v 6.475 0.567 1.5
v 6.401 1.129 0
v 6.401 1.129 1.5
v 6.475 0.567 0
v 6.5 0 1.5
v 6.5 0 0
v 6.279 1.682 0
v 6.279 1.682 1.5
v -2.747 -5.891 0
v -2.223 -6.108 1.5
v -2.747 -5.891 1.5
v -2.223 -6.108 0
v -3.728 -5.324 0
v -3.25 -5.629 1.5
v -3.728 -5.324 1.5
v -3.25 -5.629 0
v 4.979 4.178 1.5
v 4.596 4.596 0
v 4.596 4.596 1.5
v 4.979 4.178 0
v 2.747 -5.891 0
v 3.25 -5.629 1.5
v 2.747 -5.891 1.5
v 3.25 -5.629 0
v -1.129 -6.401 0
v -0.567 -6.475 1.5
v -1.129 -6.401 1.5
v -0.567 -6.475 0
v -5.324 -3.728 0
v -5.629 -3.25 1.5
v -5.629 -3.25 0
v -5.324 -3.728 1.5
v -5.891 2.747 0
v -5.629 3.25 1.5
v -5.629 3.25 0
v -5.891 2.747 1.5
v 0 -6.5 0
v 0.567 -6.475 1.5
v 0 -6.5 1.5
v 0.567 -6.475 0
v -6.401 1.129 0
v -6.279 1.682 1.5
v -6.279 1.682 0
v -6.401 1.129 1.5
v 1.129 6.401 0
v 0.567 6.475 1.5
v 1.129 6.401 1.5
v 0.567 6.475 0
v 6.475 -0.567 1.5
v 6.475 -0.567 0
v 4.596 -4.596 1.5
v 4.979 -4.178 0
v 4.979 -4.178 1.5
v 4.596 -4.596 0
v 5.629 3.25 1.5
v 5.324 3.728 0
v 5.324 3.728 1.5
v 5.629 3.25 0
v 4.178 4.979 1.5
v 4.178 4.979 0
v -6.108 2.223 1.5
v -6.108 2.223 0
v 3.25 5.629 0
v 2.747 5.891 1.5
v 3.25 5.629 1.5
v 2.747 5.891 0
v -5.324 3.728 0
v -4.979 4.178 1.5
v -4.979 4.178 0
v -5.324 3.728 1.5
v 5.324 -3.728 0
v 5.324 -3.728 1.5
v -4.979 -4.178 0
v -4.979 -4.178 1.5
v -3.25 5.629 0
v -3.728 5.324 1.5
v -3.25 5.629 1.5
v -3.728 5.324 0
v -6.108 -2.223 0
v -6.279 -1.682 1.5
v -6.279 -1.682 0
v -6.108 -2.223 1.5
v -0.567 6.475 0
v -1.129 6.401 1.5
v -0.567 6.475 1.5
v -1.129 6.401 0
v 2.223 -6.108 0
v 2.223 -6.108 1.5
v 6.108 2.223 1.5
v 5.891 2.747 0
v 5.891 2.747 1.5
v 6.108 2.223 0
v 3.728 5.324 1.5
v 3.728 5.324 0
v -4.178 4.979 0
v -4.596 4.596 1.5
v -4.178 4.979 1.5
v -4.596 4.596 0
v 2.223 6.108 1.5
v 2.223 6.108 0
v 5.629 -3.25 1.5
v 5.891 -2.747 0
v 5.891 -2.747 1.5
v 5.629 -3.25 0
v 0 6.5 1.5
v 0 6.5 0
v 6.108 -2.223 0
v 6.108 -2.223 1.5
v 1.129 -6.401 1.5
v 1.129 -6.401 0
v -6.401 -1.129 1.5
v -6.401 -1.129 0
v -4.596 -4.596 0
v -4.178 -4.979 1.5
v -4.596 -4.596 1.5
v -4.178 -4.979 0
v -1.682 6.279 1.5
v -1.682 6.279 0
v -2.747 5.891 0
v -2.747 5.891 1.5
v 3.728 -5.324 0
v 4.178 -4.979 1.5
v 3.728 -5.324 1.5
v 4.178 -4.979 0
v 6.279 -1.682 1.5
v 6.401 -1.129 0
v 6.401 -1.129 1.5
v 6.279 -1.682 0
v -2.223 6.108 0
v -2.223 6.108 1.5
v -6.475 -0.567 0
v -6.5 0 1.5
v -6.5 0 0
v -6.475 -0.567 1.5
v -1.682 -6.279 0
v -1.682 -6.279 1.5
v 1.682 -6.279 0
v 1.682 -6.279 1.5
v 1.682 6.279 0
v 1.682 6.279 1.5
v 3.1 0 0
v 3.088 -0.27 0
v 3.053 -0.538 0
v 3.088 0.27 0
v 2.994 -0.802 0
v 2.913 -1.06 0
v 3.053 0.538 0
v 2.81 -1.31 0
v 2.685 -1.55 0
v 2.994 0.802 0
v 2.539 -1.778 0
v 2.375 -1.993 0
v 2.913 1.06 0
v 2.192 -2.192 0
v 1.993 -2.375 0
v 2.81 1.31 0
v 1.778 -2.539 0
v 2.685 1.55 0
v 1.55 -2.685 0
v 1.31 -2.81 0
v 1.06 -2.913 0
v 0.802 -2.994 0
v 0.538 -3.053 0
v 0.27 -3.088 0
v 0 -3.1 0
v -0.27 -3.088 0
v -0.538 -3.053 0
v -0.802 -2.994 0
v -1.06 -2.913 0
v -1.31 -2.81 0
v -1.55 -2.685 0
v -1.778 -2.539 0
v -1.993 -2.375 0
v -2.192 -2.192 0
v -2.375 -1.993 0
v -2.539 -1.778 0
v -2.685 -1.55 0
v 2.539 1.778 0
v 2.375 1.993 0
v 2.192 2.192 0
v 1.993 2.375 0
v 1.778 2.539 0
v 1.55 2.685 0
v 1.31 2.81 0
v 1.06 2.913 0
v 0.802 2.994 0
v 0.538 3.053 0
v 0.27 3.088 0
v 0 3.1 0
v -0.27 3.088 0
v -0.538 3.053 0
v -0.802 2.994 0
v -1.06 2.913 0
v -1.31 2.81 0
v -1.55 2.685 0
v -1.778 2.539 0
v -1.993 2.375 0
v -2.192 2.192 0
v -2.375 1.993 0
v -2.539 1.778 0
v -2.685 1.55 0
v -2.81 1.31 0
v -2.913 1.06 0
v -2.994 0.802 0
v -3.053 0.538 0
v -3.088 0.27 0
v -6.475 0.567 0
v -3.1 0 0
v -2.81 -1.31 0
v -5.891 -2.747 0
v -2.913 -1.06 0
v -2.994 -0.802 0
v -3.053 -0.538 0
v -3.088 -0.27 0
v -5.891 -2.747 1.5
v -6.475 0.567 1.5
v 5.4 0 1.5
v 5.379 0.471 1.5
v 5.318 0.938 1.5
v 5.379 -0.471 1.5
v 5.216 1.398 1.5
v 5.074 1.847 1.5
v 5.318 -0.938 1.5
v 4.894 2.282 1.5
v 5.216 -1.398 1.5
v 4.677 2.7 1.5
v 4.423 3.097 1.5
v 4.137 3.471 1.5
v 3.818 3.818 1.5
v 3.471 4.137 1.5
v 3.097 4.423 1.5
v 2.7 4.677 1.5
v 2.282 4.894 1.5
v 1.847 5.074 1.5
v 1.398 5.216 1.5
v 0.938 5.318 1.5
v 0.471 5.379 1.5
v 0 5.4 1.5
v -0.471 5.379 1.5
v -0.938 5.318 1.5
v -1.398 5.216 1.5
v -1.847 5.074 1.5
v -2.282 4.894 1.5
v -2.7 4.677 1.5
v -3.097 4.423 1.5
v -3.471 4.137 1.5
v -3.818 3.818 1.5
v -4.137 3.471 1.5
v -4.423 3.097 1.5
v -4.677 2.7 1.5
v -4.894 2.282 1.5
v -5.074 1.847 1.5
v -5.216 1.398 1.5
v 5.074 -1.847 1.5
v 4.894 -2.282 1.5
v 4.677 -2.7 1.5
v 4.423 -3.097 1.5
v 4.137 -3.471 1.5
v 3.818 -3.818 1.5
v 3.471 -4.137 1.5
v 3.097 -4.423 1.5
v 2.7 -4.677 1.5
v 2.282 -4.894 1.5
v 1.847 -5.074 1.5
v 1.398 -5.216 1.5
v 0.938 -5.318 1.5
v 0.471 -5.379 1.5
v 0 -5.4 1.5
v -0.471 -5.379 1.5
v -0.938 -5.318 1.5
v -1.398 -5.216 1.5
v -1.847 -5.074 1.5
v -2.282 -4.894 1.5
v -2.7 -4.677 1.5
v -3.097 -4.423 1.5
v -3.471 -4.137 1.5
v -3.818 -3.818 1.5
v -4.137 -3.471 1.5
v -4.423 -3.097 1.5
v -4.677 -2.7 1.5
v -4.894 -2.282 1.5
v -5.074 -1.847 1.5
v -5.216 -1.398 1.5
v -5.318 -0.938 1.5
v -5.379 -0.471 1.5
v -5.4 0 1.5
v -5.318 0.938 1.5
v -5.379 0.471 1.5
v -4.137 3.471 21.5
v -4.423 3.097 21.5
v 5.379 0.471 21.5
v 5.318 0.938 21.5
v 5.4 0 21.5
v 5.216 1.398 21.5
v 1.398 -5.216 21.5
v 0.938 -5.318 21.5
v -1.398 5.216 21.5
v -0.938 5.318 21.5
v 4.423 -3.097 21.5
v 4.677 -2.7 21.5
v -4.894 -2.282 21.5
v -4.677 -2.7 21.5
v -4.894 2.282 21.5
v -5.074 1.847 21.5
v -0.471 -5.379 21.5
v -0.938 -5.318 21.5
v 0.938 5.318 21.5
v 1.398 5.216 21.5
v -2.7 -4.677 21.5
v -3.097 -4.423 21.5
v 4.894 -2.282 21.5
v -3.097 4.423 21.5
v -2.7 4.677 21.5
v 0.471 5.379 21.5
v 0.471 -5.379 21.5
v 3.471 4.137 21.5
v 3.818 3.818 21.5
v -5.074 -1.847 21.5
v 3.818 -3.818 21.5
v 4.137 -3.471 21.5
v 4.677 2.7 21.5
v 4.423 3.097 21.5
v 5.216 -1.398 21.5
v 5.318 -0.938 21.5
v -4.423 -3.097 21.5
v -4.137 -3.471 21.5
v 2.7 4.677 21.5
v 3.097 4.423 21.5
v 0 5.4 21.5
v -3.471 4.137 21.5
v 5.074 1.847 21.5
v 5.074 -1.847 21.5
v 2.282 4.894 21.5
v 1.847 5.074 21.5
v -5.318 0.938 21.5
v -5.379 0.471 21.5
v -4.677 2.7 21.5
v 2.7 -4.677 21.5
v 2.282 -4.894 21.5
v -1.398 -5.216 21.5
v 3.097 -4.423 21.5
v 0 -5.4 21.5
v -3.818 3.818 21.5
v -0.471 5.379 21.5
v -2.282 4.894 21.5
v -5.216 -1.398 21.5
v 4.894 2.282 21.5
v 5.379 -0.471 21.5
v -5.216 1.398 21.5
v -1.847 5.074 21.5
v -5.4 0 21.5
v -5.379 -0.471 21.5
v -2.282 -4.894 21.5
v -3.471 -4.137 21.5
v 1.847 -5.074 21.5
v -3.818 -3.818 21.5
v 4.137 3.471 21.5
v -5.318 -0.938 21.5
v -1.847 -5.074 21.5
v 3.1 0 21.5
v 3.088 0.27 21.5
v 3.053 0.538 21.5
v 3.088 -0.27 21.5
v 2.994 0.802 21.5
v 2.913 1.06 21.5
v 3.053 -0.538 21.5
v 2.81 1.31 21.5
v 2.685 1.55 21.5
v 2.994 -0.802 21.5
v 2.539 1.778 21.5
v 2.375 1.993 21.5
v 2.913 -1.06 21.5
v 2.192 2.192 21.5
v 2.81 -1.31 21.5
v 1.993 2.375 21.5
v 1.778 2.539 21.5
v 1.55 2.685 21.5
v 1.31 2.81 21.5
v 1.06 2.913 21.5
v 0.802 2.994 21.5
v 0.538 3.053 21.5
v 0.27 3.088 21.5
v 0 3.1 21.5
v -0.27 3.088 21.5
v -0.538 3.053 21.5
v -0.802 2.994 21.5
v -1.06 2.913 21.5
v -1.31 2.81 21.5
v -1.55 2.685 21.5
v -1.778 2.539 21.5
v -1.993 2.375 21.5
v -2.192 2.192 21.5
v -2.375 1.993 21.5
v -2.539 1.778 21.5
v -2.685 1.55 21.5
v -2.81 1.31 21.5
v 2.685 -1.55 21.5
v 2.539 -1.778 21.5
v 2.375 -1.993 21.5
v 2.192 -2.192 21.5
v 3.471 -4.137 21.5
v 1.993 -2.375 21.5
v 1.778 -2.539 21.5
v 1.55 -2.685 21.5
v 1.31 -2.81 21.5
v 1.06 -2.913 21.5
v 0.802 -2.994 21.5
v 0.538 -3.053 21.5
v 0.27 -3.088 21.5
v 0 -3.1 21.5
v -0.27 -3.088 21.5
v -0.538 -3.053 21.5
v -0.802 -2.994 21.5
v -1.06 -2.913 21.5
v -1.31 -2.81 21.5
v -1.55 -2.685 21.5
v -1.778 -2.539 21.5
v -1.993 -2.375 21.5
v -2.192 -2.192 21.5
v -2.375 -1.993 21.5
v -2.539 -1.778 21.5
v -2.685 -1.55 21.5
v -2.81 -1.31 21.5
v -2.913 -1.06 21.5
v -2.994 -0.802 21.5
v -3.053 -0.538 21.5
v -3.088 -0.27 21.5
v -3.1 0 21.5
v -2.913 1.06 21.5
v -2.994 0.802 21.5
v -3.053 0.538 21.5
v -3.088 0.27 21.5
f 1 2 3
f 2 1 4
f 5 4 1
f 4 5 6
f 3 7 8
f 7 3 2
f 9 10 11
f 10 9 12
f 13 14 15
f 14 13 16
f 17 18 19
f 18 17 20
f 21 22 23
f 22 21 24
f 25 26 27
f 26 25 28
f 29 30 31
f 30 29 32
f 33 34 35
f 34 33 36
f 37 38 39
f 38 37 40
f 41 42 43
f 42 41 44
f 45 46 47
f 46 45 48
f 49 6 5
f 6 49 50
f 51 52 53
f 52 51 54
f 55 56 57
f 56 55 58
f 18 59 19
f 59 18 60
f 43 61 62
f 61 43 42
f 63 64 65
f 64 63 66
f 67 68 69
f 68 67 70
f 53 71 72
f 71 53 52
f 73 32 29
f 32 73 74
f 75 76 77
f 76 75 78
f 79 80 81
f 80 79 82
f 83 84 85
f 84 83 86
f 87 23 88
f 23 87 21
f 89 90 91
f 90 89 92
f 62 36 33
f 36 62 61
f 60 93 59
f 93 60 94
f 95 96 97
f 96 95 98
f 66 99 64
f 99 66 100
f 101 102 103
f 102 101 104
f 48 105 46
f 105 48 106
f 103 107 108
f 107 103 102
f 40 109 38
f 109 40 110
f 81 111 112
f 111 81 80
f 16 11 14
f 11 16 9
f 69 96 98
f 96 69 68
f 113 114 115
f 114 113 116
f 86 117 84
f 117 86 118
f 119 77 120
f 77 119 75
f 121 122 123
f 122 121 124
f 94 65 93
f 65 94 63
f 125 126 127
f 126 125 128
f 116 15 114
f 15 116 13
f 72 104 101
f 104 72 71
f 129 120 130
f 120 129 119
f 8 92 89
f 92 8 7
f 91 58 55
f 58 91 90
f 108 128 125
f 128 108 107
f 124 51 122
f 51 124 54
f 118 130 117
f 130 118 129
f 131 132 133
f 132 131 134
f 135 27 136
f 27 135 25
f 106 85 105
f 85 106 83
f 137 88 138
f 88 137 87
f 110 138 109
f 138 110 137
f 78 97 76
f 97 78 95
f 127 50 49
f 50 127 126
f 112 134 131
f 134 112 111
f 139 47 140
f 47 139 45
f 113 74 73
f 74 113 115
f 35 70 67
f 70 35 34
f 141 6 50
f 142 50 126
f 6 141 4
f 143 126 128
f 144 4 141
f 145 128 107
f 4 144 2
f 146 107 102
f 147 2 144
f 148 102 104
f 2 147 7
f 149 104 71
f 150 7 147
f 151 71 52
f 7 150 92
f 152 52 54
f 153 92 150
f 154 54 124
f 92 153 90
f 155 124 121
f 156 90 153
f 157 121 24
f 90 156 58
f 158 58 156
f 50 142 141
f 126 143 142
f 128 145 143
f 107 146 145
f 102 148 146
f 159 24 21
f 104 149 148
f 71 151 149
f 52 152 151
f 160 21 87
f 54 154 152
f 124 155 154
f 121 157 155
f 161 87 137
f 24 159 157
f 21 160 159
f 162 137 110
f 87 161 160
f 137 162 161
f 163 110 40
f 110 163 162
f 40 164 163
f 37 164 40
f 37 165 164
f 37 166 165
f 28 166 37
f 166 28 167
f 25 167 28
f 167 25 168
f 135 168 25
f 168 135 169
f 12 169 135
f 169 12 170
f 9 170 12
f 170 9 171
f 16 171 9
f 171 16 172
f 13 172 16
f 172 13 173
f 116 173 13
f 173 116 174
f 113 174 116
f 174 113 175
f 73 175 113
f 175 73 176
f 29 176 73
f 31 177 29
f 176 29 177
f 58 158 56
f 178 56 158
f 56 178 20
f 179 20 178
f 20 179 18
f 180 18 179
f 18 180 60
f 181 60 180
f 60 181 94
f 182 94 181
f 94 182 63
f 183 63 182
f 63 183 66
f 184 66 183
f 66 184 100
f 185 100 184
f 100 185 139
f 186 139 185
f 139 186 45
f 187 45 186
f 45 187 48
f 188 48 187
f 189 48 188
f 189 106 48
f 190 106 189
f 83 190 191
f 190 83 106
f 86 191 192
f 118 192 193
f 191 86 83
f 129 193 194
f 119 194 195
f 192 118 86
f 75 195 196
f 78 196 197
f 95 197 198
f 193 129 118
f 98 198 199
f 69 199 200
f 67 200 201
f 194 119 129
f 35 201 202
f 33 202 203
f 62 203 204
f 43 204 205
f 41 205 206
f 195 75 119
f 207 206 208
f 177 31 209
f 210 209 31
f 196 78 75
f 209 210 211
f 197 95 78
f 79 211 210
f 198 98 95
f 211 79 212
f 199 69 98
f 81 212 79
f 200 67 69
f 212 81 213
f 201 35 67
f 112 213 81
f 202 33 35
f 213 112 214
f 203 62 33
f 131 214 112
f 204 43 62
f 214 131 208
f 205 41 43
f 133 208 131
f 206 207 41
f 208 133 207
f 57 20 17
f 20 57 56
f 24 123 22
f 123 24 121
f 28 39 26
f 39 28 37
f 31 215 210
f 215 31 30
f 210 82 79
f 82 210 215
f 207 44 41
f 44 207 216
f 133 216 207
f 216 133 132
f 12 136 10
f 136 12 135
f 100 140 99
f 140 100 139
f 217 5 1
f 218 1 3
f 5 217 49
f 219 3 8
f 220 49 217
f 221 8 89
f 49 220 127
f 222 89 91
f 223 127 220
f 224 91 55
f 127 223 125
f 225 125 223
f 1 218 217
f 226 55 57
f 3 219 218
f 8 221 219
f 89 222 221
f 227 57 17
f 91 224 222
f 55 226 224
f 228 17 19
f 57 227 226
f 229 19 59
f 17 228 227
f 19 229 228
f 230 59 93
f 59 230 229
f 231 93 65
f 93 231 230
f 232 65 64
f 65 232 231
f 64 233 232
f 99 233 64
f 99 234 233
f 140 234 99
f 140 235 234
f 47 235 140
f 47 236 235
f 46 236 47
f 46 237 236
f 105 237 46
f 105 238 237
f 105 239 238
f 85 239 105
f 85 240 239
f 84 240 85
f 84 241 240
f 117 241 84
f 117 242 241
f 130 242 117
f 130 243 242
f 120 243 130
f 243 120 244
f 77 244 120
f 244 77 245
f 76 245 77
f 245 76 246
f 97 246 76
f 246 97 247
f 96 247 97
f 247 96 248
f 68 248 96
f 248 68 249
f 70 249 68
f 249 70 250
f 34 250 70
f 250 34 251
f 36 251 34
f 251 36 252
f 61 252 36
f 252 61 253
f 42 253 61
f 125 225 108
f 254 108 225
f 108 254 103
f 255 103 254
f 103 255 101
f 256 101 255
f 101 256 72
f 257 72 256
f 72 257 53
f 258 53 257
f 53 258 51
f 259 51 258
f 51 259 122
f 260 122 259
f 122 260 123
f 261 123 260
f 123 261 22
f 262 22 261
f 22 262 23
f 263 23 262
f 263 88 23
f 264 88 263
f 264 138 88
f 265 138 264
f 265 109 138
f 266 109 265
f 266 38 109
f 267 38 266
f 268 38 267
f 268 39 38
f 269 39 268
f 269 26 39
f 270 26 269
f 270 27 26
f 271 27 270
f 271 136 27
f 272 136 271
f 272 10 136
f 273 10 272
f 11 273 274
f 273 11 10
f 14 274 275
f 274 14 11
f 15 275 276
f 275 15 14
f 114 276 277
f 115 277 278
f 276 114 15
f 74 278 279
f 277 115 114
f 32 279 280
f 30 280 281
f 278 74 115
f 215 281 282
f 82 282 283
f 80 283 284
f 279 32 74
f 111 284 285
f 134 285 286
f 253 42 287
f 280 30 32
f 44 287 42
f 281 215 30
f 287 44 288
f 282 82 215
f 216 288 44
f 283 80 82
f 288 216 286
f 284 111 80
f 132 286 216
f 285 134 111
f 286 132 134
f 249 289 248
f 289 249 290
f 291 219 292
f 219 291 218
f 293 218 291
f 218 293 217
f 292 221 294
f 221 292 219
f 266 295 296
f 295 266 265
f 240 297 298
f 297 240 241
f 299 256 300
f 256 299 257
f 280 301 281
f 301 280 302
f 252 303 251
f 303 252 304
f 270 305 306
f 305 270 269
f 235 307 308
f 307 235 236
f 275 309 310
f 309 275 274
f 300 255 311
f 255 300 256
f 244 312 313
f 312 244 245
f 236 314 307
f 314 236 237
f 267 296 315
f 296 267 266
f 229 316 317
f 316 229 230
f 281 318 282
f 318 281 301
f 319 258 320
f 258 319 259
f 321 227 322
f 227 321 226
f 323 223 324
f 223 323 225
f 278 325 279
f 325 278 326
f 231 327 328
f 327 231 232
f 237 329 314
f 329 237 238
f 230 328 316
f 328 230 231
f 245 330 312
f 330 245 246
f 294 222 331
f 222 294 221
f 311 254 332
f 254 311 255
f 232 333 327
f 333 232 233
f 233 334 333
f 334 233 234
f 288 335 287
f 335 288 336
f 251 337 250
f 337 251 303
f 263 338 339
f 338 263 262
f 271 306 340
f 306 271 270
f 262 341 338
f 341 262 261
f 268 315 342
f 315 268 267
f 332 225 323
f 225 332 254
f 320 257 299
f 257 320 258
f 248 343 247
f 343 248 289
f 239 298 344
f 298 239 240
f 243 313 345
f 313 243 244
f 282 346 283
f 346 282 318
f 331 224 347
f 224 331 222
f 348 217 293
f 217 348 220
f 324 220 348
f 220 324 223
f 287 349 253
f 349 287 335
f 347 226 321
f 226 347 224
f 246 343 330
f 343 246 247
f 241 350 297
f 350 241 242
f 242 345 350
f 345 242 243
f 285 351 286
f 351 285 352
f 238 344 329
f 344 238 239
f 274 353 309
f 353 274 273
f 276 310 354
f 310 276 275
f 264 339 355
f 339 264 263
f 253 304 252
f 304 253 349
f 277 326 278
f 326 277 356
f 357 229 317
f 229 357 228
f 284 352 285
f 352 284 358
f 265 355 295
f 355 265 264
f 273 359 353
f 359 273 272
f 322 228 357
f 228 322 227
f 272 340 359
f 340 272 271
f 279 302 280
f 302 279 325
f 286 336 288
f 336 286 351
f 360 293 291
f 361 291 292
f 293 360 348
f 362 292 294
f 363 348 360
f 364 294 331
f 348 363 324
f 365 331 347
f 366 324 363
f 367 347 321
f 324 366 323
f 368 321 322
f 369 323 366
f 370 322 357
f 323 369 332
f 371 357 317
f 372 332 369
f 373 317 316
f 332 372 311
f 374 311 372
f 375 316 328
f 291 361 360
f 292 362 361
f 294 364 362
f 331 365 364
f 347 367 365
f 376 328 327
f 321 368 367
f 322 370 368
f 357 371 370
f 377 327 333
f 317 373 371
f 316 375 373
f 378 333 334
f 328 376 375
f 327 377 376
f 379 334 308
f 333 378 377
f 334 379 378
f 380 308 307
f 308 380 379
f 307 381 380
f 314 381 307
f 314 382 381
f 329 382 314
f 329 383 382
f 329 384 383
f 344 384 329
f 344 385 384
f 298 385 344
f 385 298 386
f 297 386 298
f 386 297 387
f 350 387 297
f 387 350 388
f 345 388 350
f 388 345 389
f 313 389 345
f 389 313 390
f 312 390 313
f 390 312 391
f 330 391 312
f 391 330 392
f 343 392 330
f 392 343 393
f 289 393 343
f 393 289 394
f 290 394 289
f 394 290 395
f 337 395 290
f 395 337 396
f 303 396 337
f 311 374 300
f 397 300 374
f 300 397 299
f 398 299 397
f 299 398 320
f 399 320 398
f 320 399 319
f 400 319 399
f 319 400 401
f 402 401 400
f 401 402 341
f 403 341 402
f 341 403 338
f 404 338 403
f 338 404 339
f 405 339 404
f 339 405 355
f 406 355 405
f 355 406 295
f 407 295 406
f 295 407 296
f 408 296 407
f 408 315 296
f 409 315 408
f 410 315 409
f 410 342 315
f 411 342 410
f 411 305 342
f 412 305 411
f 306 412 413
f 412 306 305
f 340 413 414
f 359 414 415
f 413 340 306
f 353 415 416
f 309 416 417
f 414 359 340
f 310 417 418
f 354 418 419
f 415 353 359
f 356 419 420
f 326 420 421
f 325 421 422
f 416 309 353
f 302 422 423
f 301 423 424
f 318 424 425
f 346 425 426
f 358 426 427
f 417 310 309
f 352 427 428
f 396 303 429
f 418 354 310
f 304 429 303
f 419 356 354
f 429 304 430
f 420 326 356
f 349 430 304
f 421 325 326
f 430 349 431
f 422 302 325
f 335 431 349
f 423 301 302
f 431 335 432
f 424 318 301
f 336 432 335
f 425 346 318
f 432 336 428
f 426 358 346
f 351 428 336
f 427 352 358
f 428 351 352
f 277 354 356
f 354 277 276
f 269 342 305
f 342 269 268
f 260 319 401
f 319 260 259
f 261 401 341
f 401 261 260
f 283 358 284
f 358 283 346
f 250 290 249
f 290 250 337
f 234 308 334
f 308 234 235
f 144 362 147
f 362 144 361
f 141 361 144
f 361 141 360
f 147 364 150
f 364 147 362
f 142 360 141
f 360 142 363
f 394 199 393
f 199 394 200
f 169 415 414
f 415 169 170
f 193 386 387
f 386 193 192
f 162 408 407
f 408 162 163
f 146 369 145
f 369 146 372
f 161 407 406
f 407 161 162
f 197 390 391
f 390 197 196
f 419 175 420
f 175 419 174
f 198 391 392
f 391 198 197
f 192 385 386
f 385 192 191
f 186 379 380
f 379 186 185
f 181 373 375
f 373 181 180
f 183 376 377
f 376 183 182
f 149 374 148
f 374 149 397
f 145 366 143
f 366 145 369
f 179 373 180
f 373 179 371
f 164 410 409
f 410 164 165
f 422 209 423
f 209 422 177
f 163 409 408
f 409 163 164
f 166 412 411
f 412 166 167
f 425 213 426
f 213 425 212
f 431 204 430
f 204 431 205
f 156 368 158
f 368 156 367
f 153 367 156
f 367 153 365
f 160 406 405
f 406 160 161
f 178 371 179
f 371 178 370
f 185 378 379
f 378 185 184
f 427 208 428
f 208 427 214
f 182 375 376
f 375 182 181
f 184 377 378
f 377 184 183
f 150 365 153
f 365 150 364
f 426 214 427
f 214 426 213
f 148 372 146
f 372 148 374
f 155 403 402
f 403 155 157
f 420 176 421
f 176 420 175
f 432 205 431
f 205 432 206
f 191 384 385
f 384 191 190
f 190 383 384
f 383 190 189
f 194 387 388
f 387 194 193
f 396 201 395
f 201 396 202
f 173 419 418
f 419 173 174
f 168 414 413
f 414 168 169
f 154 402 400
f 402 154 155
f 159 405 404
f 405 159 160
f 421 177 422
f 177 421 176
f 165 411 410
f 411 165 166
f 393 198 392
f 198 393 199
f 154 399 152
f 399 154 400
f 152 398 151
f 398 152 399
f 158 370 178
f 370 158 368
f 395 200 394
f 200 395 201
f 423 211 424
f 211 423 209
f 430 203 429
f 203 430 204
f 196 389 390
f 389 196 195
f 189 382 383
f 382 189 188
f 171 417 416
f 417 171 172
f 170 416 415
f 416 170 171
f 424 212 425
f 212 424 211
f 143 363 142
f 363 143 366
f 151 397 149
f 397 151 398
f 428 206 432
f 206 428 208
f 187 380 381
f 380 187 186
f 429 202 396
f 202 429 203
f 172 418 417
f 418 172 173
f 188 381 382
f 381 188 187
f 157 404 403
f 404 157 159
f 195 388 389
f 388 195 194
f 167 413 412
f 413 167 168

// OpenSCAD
// Adapter sleeve - a collar with a tube sleeve below, boring through, to adapt a smaller tube
// to a larger tube rack hole. NOVEL general part.
//

collar_d   = 13;
collar_h   = 1.5;
sleeve_d   = 10.8;
sleeve_h   = 21.5;
bore_d     = 6.2;

$fn = 72;

t = min(bore_d / 2 - 1, 2);          // wall thickness for the sleeve

difference() {
    union() {
        cylinder(h = collar_h, d = collar_d);                 // collar (contact the rack)
        cylinder(h = sleeve_h, d = sleeve_d);                 // sleeve body
    }
    translate([0, 0, -1]) cylinder(h = sleeve_h + 2, d = bore_d);   // through-bore
}
